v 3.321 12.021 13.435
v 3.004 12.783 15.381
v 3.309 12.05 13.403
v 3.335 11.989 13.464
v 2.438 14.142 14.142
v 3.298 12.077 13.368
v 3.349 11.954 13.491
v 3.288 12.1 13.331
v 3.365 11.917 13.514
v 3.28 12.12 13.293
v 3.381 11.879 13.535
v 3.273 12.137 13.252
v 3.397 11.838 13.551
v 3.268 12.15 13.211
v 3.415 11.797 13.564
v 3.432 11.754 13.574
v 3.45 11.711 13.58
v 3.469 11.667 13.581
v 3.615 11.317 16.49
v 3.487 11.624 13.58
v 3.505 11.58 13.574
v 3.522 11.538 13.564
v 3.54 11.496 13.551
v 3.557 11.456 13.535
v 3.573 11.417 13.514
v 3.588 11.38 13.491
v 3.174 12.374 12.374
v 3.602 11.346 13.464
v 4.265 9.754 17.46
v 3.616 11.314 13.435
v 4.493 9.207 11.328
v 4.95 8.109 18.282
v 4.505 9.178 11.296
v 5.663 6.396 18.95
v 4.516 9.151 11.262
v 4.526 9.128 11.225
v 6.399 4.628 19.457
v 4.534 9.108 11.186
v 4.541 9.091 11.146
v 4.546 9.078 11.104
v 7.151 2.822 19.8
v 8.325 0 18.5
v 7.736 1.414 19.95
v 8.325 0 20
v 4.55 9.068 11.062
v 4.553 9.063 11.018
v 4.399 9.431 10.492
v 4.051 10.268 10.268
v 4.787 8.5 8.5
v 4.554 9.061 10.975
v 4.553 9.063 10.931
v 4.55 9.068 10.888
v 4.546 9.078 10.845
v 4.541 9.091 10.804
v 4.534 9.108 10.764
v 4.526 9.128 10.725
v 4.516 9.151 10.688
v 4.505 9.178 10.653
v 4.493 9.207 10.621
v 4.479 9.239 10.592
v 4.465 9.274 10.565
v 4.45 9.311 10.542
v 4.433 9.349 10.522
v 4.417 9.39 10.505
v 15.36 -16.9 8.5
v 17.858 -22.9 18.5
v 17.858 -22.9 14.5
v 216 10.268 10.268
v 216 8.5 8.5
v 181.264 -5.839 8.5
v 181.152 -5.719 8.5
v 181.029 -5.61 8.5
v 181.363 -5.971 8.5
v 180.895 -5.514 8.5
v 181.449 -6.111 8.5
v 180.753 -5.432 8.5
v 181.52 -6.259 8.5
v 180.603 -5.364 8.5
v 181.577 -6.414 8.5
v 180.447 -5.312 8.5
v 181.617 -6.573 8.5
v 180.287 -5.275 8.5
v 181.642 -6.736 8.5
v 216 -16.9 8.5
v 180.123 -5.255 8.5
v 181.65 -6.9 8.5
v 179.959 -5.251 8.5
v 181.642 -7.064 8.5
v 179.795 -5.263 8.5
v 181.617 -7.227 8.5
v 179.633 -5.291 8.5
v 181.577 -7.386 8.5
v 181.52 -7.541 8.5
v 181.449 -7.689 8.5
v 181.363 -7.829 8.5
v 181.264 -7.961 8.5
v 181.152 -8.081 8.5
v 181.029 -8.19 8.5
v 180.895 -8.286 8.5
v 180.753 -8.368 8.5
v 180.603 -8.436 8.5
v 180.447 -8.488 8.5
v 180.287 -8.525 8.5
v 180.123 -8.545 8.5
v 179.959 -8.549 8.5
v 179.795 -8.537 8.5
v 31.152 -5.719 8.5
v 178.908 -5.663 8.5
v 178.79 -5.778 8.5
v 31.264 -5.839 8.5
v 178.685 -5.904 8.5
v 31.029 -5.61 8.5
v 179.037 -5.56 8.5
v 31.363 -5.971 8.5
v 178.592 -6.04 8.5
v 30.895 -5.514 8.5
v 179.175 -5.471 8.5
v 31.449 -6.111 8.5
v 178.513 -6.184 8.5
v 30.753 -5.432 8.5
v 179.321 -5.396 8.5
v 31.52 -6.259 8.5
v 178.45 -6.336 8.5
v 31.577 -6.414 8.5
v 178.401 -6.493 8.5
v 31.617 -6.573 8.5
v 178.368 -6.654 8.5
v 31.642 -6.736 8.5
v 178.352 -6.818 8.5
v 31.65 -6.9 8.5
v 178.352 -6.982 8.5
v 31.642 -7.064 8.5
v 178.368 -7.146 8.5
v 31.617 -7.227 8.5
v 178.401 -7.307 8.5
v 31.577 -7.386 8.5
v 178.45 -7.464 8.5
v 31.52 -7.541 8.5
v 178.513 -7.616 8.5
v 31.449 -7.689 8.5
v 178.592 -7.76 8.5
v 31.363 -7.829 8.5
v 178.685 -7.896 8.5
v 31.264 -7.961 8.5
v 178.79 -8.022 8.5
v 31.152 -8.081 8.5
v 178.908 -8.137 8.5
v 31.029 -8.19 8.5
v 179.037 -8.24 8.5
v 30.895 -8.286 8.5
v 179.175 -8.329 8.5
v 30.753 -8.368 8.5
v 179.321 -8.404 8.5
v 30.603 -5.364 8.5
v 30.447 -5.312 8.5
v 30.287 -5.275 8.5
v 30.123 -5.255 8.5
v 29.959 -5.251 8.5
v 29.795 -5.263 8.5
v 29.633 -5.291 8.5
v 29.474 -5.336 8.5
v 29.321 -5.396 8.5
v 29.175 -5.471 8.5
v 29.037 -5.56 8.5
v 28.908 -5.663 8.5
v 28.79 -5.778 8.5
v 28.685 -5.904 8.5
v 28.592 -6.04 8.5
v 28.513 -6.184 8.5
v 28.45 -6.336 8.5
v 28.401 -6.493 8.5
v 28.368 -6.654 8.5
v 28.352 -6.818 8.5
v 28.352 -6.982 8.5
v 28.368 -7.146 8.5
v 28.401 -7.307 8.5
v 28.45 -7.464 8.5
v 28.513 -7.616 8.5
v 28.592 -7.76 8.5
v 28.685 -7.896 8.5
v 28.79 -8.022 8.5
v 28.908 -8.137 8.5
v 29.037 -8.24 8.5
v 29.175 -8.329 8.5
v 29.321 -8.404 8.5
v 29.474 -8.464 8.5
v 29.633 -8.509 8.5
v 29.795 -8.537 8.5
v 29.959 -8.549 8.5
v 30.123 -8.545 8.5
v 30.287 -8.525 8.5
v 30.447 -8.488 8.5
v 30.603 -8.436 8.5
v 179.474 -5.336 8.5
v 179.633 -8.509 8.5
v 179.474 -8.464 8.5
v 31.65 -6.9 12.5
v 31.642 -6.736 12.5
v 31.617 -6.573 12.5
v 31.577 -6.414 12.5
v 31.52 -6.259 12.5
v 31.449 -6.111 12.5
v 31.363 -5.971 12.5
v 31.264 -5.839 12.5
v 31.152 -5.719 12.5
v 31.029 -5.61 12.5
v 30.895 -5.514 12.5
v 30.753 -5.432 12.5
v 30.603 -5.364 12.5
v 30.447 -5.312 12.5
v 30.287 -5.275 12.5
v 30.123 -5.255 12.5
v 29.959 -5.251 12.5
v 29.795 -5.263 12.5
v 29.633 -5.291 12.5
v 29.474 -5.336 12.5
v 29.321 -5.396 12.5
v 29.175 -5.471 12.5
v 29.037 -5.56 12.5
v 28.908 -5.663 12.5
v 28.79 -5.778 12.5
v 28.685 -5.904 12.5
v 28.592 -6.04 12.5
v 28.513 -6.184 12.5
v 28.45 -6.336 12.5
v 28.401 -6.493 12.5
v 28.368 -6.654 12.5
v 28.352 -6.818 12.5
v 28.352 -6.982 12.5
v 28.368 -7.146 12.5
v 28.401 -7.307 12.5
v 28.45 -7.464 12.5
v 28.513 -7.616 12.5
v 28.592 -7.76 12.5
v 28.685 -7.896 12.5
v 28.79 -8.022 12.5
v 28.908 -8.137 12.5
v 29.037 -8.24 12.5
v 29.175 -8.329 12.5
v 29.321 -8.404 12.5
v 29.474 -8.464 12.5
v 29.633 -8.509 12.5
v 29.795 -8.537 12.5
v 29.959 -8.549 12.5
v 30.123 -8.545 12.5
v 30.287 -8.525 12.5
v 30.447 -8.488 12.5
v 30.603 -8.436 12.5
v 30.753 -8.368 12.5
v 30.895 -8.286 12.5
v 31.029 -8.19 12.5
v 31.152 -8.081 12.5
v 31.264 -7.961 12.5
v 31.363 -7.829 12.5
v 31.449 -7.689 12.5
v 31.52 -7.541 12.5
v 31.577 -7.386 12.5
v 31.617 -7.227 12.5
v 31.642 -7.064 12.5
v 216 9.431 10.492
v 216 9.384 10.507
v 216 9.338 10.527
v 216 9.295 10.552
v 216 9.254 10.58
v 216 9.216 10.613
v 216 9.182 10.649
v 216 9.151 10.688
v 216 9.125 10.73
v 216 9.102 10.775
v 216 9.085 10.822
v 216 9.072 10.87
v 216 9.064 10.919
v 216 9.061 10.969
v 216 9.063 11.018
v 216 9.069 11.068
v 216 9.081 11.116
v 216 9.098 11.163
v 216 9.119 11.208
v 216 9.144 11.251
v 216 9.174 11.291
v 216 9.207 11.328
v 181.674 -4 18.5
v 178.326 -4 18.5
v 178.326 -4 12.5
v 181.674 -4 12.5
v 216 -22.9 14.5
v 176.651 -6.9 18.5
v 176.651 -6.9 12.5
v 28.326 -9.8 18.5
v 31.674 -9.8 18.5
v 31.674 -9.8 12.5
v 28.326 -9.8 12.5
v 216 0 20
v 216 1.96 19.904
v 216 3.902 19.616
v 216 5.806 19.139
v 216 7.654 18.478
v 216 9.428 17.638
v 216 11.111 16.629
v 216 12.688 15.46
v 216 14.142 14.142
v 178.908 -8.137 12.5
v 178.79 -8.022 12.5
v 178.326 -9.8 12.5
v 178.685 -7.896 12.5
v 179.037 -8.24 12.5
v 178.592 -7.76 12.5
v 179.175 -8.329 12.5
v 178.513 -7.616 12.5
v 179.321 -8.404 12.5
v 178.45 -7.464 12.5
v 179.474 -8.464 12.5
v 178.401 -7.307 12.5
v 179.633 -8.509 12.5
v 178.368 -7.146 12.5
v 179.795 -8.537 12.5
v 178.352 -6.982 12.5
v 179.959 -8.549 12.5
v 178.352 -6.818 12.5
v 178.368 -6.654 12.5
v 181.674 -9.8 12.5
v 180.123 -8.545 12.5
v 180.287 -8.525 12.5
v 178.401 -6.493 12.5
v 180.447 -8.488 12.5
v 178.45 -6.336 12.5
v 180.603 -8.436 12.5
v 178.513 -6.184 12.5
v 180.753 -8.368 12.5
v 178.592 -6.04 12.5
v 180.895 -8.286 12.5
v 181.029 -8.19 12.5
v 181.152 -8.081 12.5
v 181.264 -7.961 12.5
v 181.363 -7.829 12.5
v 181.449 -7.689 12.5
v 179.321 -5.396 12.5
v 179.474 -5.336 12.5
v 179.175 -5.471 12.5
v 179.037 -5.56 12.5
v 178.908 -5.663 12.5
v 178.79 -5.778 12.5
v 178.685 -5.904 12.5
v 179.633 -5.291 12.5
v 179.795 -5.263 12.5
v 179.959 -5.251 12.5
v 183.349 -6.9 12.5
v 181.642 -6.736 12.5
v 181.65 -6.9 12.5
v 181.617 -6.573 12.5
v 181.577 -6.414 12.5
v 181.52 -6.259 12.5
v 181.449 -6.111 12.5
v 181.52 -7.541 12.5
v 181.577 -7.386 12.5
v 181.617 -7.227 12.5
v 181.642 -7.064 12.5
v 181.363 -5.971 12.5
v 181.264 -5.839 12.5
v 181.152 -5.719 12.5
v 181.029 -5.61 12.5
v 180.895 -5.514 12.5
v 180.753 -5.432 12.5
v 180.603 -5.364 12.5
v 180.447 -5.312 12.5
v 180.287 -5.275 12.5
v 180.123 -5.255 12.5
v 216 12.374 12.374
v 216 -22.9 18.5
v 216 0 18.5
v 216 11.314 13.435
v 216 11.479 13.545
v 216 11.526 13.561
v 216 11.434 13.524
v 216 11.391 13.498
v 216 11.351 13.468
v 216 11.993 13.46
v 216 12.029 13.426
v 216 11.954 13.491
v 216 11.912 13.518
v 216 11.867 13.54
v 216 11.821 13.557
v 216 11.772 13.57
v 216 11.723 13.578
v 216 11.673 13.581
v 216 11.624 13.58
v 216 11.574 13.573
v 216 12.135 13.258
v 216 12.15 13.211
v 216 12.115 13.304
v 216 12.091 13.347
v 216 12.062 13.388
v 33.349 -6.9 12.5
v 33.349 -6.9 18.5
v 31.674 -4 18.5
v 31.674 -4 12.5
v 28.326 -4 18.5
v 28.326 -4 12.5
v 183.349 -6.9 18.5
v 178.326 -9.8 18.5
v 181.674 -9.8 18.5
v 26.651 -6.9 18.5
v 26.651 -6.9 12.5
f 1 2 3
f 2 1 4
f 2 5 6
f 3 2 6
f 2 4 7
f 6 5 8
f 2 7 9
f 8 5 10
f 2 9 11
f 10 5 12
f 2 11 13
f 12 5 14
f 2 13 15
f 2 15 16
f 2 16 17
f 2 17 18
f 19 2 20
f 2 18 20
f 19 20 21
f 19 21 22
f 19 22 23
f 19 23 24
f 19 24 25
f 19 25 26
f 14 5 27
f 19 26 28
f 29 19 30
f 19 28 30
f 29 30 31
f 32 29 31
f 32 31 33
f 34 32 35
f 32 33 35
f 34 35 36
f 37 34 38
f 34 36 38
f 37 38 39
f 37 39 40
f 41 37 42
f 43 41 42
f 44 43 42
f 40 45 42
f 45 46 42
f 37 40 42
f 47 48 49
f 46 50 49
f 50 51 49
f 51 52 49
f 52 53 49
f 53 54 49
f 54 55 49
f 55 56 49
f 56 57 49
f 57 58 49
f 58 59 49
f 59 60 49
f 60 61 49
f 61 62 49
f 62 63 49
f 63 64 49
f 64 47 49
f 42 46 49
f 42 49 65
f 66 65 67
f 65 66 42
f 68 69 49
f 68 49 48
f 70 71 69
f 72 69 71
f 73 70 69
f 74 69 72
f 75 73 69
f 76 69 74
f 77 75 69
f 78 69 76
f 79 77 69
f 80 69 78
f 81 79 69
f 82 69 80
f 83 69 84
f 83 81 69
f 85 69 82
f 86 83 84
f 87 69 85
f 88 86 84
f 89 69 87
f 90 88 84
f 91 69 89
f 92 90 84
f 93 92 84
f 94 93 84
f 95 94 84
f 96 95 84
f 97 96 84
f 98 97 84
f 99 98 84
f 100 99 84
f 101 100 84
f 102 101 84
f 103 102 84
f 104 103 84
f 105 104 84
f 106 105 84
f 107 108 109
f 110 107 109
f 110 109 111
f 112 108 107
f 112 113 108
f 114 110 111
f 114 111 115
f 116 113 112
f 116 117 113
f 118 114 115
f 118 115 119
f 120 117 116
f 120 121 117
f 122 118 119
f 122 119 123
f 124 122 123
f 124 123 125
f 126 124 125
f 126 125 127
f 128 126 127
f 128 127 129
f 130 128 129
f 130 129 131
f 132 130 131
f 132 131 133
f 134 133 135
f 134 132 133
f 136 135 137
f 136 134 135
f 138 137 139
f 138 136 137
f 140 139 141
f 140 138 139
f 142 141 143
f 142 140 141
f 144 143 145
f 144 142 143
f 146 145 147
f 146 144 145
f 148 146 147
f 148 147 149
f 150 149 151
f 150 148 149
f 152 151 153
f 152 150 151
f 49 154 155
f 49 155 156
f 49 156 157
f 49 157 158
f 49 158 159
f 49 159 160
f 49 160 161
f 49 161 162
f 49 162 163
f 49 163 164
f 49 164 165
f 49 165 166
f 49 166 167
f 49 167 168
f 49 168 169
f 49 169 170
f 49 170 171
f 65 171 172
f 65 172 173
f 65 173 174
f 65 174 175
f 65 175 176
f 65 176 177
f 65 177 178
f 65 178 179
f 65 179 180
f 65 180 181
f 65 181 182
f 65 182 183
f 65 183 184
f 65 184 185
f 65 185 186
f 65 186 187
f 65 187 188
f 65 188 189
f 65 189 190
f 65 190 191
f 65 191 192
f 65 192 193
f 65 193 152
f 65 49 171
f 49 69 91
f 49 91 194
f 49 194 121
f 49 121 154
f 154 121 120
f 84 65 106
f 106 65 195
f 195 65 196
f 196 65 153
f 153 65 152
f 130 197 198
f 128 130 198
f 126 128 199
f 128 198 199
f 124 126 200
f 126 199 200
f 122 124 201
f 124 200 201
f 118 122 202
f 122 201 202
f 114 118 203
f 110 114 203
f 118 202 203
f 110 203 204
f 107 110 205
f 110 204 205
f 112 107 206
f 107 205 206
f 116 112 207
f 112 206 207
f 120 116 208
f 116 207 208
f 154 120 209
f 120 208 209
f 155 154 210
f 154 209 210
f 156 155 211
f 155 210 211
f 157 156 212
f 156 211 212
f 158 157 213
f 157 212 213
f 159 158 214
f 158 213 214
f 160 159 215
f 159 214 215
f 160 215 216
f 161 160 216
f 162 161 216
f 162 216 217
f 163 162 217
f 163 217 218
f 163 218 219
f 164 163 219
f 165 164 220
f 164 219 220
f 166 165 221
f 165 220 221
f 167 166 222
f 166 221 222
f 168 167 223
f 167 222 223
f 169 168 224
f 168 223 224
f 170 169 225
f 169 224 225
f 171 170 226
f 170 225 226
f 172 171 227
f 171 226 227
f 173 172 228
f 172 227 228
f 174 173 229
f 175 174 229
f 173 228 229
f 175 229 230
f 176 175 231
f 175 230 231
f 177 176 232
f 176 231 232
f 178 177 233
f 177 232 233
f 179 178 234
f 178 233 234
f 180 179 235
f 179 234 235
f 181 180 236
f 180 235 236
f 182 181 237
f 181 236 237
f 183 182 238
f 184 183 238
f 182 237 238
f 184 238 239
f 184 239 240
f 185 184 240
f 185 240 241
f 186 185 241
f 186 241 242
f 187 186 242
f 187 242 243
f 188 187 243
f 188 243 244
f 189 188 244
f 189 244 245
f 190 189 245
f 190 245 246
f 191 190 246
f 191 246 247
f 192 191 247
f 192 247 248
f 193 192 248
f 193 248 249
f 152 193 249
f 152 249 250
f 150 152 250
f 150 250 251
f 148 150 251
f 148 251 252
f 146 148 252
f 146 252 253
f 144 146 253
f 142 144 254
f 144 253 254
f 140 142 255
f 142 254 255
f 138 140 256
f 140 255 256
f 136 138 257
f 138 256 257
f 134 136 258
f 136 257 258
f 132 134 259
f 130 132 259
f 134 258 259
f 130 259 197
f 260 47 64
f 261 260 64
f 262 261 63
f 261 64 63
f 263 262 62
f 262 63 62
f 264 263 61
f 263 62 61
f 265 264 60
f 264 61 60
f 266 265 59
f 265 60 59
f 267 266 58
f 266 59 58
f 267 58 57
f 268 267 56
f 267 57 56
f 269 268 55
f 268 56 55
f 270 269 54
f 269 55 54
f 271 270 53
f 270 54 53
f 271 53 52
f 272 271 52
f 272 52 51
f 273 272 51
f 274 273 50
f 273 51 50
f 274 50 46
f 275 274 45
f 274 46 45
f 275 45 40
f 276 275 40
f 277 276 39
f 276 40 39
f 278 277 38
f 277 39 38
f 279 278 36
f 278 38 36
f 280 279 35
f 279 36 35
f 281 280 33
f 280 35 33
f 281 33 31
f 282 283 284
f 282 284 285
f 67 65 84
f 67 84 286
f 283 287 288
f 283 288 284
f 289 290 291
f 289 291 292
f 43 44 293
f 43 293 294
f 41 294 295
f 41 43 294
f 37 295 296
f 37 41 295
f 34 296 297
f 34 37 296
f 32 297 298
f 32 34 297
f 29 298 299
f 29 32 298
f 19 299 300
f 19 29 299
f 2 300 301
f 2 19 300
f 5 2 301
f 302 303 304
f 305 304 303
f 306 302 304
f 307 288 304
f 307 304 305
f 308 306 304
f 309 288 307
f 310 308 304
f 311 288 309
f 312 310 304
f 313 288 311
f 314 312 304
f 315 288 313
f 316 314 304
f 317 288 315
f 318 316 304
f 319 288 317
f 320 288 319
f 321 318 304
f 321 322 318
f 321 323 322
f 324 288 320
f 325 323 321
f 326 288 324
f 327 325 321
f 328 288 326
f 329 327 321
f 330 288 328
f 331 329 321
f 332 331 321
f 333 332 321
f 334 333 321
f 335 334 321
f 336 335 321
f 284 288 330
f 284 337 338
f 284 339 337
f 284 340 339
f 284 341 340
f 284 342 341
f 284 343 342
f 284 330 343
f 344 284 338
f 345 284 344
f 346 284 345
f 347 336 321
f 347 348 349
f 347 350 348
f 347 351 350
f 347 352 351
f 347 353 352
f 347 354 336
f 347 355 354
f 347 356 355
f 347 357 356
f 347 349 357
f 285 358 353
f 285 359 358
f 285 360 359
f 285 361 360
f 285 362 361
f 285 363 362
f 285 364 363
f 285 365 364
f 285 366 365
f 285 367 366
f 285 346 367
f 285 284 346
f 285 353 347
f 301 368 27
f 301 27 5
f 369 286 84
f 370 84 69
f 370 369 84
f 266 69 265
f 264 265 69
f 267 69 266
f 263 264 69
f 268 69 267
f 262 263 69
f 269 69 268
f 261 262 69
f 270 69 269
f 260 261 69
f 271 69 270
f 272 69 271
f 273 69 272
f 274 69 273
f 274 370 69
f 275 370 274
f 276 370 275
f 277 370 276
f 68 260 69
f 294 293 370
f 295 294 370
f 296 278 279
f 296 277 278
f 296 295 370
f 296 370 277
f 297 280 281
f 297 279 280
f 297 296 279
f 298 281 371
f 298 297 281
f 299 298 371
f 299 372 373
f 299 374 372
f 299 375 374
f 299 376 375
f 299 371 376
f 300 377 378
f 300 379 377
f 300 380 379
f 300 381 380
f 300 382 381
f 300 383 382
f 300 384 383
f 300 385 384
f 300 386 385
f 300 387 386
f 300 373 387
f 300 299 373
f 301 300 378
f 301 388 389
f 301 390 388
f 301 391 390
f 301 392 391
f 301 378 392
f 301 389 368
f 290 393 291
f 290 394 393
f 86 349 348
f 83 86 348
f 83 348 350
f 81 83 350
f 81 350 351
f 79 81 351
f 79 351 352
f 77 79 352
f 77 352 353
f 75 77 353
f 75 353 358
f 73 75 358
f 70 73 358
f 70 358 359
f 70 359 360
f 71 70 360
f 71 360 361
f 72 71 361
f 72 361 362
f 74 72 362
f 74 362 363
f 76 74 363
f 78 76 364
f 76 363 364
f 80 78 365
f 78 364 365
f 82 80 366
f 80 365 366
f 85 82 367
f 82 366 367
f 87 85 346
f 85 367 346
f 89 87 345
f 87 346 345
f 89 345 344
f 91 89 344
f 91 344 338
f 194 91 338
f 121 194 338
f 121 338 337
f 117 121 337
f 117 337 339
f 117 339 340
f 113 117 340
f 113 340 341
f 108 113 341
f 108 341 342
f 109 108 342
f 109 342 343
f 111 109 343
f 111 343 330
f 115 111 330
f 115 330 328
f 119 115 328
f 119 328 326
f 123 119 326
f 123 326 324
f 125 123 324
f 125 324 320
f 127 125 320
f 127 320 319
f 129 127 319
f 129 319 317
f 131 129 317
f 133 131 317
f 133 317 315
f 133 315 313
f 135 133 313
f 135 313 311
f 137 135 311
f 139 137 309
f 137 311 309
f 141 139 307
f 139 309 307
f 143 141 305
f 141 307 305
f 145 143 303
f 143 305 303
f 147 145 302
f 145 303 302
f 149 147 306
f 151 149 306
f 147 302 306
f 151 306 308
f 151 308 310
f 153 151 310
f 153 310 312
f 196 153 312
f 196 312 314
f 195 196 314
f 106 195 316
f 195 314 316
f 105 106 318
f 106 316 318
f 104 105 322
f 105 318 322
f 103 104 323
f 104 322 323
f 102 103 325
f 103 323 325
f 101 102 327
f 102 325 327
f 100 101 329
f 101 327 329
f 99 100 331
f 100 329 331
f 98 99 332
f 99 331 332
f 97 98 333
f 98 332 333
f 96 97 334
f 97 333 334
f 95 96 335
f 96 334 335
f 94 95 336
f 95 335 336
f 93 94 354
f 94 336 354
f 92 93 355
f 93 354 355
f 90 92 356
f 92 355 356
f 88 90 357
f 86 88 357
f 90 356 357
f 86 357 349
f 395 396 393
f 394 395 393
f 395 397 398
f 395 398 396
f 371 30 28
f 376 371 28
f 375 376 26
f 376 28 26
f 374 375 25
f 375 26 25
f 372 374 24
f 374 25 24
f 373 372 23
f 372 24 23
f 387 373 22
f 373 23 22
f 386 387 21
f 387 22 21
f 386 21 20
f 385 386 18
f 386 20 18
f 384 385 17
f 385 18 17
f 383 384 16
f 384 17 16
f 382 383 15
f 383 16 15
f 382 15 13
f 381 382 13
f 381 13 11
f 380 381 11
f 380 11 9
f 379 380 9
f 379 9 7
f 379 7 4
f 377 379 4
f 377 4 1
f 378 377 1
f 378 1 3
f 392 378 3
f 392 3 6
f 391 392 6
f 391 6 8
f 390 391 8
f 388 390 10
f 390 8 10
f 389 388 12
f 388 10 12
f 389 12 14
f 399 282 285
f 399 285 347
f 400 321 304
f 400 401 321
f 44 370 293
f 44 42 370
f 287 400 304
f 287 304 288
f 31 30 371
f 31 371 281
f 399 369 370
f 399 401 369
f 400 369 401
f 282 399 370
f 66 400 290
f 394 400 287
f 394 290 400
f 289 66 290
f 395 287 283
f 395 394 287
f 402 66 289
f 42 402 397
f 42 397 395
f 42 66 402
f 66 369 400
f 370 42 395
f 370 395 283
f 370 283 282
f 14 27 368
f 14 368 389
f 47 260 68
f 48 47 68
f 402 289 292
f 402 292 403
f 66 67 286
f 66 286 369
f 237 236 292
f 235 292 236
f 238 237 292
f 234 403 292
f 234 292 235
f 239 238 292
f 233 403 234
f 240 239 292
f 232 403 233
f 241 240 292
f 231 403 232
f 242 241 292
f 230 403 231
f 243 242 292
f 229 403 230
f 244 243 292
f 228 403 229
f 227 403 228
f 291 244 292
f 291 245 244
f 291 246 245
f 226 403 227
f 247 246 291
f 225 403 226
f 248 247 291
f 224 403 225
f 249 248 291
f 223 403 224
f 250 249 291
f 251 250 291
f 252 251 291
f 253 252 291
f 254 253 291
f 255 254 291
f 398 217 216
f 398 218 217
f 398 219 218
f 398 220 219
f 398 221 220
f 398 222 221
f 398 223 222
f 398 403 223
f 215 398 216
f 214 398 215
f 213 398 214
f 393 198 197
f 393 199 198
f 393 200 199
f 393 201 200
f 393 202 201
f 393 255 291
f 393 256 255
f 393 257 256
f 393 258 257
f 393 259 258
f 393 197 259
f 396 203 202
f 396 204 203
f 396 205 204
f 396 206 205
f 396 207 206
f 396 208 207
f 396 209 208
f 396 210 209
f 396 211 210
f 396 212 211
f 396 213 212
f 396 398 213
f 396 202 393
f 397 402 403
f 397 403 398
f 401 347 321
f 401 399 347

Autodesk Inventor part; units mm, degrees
ref_plane "YZ Plane" through (0, 0, 0) normal (1, 0, 0) x (0, 1, 0)
ref_plane "XZ Plane" through (0, 0, 0) normal (0, 1, 0) x (-1, 0, 0)
ref_plane "XY Plane" through (0, 0, 0) normal (0, 0, 1) x (1, 0, 0)
sketch "Sketch1" plane through (0, 0, 0) normal (1, 0, 0) x (0, 1, 0)
  circle A0 centre (0, 0) radius 20
  line L0 (8.5, 8.5) -> (-16.9, 8.5)
  line L1 (8.5, 8.5) -> (8.5, -16.9)
  line L2 (0, 0) -> (0, 20)
  line L3 (0, 20) -> (-60.9241, 20)
  line L4 (-60.9241, 20) -> (-60.9241, 18.5)
  line L5 (-60.9241, 18.5) -> (0, 18.5)
  line L6 (0, 18.5) -> (0, 20)
  line L7 (0, 0) -> (14.1421, 14.1421)
  line L8 (0, 0) -> (20, 0)
  line L9 (-16.9, 8.5) -> (-16.9, 18.5)
  line L10 (-16.9, 8.5) -> (-22.9, 14.5)
  line L11 (-22.9, 14.5) -> (-22.9, 18.5)
  line L12 (12.3744, 12.3744) -> (12.1502, 13.2109)
  line L13 (11.3137, 13.435) -> (9.2071, 11.3284)
  line L14 (9.4313, 10.4919) -> (10.2678, 10.2678)
  line L15 (8.5, 8.5) -> (8.5, -16.9)
  line L16 (20, 0) -> (20, -60.9241)
  line L17 (20, -60.9241) -> (18.5, -60.9241)
  line L18 (18.5, -60.9241) -> (18.5, 0)
  line L19 (8.5, -16.9) -> (18.5, -16.9)
  line L20 (8.5, -16.9) -> (14.5, -22.9)
  line L21 (14.5, -22.9) -> (18.5, -22.9)
  arc A1 (9.2071, 11.3284) -> (9.4313, 10.4919) centre (9.5607, 10.9749) ccw
  arc A2 (12.1502, 13.2109) -> (11.3137, 13.435) centre (11.6673, 13.0815) ccw
  line L22 (10.4311, 10.4311) -> (9.483, 10.6851)
  arc A3 (9.3485, 11.187) -> (9.483, 10.6851) centre (9.5607, 10.9749) ccw
  line L23 (9.3485, 11.187) -> (11.4551, 13.2936)
  arc A4 (11.957, 13.1591) -> (11.4551, 13.2936) centre (11.6673, 13.0815) ccw
  line L24 (11.957, 13.1591) -> (12.2111, 12.2111)
  point P0 (0, 8.5)
  point P1 (-17.7041, 9.3041)
  point P2 (-16.9, 10.6953)
  dimension "d0" = 40
  dimension "d1" = 25.4
  dimension "d2" = 1.5
  dimension "d4" = 45
  dimension "d6" = 45
  dimension "d7" = 4
  dimension "d8" = 10
  dimension "d10" = 2.5
  dimension "d11" = 2.5
  dimension "d12" = 60
  dimension "d13" = 1.5
  dimension "d15" = 0.5
  dimension "d16" = 0.2
extrude "Extrusion1" add sketch "Sketch1" along normal blind 216 contours L7 L12 A2 L13 A1 L14 L0 L2 A0 | L5 L2 L0 L9 A0 | A0 L9 L5 | L9 L10 A0 | A0 L10 L11 L5 L9
sketch "Sketch2" plane through (0, -22.9, 18.5) normal (0, 0, 1) x (1, 0, 0)
  line L0 (0, 22.9) -> (0, 0) projected
  line L1 (0, 0) -> (216, 0) projected
  line L2 (216, 22.9) -> (216, 0) projected
  line L3 (0, 22.9) -> (216, 22.9) projected
  line L4 (28.3257, 13.1) -> (26.6514, 16)
  line L5 (26.6514, 16) -> (28.3257, 18.9)
  line L6 (28.3257, 18.9) -> (31.6743, 18.9)
  line L7 (31.6743, 18.9) -> (33.3486, 16)
  line L8 (33.3486, 16) -> (31.6743, 13.1)
  line L9 (31.6743, 13.1) -> (28.3257, 13.1)
  line L10 (0, 6) -> (216, 6) projected
  circle A0 centre (30, 16) radius 1.65
  dimension "d20" = 10
  dimension "d21" = 5.8
  dimension "d22" = 30
  dimension "d25" = 3.3
extrude "Extrusion2" cut sketch "Sketch2" against normal blind 6 contours L4 L5 L6 L7 L8 L9 | A0
extrude "Extrusion3" cut sketch "Sketch2" against normal through all contours A0
sketch "Sketch3" plane through (0, -22.9, 18.5) normal (0, 0, 1) x (1, 0, 0)
  line L0 (0, 37.0421) -> (216, 37.0421) projected
  line L1 (0, 0) -> (216, 0) projected
  line L2 (0, 22.9) -> (0, 0) projected
  line L3 (0, 22.9) -> (0, 37.0421) projected
  line L4 (2.4384, 37.0421) -> (17.8575, 0)
  line L5 (0, 0) -> (216, 0) projected
  line L6 (2.4384, 37.0421) -> (0, 42.9) projected
  point P0 (17.8575, 0)
  dimension "d28" = 112.6
extrude "Extrusion4" cut sketch "Sketch3" along normal through all both and the other way through all
pattern_linear "Rectangular Pattern1" count 2 spacing 150 along (1, 0, 0) of "Extrusion3", "Extrusion2"
properties part number "ESQUINA_REDONDEADA_R20" material "Steel, Mild, Welded"
